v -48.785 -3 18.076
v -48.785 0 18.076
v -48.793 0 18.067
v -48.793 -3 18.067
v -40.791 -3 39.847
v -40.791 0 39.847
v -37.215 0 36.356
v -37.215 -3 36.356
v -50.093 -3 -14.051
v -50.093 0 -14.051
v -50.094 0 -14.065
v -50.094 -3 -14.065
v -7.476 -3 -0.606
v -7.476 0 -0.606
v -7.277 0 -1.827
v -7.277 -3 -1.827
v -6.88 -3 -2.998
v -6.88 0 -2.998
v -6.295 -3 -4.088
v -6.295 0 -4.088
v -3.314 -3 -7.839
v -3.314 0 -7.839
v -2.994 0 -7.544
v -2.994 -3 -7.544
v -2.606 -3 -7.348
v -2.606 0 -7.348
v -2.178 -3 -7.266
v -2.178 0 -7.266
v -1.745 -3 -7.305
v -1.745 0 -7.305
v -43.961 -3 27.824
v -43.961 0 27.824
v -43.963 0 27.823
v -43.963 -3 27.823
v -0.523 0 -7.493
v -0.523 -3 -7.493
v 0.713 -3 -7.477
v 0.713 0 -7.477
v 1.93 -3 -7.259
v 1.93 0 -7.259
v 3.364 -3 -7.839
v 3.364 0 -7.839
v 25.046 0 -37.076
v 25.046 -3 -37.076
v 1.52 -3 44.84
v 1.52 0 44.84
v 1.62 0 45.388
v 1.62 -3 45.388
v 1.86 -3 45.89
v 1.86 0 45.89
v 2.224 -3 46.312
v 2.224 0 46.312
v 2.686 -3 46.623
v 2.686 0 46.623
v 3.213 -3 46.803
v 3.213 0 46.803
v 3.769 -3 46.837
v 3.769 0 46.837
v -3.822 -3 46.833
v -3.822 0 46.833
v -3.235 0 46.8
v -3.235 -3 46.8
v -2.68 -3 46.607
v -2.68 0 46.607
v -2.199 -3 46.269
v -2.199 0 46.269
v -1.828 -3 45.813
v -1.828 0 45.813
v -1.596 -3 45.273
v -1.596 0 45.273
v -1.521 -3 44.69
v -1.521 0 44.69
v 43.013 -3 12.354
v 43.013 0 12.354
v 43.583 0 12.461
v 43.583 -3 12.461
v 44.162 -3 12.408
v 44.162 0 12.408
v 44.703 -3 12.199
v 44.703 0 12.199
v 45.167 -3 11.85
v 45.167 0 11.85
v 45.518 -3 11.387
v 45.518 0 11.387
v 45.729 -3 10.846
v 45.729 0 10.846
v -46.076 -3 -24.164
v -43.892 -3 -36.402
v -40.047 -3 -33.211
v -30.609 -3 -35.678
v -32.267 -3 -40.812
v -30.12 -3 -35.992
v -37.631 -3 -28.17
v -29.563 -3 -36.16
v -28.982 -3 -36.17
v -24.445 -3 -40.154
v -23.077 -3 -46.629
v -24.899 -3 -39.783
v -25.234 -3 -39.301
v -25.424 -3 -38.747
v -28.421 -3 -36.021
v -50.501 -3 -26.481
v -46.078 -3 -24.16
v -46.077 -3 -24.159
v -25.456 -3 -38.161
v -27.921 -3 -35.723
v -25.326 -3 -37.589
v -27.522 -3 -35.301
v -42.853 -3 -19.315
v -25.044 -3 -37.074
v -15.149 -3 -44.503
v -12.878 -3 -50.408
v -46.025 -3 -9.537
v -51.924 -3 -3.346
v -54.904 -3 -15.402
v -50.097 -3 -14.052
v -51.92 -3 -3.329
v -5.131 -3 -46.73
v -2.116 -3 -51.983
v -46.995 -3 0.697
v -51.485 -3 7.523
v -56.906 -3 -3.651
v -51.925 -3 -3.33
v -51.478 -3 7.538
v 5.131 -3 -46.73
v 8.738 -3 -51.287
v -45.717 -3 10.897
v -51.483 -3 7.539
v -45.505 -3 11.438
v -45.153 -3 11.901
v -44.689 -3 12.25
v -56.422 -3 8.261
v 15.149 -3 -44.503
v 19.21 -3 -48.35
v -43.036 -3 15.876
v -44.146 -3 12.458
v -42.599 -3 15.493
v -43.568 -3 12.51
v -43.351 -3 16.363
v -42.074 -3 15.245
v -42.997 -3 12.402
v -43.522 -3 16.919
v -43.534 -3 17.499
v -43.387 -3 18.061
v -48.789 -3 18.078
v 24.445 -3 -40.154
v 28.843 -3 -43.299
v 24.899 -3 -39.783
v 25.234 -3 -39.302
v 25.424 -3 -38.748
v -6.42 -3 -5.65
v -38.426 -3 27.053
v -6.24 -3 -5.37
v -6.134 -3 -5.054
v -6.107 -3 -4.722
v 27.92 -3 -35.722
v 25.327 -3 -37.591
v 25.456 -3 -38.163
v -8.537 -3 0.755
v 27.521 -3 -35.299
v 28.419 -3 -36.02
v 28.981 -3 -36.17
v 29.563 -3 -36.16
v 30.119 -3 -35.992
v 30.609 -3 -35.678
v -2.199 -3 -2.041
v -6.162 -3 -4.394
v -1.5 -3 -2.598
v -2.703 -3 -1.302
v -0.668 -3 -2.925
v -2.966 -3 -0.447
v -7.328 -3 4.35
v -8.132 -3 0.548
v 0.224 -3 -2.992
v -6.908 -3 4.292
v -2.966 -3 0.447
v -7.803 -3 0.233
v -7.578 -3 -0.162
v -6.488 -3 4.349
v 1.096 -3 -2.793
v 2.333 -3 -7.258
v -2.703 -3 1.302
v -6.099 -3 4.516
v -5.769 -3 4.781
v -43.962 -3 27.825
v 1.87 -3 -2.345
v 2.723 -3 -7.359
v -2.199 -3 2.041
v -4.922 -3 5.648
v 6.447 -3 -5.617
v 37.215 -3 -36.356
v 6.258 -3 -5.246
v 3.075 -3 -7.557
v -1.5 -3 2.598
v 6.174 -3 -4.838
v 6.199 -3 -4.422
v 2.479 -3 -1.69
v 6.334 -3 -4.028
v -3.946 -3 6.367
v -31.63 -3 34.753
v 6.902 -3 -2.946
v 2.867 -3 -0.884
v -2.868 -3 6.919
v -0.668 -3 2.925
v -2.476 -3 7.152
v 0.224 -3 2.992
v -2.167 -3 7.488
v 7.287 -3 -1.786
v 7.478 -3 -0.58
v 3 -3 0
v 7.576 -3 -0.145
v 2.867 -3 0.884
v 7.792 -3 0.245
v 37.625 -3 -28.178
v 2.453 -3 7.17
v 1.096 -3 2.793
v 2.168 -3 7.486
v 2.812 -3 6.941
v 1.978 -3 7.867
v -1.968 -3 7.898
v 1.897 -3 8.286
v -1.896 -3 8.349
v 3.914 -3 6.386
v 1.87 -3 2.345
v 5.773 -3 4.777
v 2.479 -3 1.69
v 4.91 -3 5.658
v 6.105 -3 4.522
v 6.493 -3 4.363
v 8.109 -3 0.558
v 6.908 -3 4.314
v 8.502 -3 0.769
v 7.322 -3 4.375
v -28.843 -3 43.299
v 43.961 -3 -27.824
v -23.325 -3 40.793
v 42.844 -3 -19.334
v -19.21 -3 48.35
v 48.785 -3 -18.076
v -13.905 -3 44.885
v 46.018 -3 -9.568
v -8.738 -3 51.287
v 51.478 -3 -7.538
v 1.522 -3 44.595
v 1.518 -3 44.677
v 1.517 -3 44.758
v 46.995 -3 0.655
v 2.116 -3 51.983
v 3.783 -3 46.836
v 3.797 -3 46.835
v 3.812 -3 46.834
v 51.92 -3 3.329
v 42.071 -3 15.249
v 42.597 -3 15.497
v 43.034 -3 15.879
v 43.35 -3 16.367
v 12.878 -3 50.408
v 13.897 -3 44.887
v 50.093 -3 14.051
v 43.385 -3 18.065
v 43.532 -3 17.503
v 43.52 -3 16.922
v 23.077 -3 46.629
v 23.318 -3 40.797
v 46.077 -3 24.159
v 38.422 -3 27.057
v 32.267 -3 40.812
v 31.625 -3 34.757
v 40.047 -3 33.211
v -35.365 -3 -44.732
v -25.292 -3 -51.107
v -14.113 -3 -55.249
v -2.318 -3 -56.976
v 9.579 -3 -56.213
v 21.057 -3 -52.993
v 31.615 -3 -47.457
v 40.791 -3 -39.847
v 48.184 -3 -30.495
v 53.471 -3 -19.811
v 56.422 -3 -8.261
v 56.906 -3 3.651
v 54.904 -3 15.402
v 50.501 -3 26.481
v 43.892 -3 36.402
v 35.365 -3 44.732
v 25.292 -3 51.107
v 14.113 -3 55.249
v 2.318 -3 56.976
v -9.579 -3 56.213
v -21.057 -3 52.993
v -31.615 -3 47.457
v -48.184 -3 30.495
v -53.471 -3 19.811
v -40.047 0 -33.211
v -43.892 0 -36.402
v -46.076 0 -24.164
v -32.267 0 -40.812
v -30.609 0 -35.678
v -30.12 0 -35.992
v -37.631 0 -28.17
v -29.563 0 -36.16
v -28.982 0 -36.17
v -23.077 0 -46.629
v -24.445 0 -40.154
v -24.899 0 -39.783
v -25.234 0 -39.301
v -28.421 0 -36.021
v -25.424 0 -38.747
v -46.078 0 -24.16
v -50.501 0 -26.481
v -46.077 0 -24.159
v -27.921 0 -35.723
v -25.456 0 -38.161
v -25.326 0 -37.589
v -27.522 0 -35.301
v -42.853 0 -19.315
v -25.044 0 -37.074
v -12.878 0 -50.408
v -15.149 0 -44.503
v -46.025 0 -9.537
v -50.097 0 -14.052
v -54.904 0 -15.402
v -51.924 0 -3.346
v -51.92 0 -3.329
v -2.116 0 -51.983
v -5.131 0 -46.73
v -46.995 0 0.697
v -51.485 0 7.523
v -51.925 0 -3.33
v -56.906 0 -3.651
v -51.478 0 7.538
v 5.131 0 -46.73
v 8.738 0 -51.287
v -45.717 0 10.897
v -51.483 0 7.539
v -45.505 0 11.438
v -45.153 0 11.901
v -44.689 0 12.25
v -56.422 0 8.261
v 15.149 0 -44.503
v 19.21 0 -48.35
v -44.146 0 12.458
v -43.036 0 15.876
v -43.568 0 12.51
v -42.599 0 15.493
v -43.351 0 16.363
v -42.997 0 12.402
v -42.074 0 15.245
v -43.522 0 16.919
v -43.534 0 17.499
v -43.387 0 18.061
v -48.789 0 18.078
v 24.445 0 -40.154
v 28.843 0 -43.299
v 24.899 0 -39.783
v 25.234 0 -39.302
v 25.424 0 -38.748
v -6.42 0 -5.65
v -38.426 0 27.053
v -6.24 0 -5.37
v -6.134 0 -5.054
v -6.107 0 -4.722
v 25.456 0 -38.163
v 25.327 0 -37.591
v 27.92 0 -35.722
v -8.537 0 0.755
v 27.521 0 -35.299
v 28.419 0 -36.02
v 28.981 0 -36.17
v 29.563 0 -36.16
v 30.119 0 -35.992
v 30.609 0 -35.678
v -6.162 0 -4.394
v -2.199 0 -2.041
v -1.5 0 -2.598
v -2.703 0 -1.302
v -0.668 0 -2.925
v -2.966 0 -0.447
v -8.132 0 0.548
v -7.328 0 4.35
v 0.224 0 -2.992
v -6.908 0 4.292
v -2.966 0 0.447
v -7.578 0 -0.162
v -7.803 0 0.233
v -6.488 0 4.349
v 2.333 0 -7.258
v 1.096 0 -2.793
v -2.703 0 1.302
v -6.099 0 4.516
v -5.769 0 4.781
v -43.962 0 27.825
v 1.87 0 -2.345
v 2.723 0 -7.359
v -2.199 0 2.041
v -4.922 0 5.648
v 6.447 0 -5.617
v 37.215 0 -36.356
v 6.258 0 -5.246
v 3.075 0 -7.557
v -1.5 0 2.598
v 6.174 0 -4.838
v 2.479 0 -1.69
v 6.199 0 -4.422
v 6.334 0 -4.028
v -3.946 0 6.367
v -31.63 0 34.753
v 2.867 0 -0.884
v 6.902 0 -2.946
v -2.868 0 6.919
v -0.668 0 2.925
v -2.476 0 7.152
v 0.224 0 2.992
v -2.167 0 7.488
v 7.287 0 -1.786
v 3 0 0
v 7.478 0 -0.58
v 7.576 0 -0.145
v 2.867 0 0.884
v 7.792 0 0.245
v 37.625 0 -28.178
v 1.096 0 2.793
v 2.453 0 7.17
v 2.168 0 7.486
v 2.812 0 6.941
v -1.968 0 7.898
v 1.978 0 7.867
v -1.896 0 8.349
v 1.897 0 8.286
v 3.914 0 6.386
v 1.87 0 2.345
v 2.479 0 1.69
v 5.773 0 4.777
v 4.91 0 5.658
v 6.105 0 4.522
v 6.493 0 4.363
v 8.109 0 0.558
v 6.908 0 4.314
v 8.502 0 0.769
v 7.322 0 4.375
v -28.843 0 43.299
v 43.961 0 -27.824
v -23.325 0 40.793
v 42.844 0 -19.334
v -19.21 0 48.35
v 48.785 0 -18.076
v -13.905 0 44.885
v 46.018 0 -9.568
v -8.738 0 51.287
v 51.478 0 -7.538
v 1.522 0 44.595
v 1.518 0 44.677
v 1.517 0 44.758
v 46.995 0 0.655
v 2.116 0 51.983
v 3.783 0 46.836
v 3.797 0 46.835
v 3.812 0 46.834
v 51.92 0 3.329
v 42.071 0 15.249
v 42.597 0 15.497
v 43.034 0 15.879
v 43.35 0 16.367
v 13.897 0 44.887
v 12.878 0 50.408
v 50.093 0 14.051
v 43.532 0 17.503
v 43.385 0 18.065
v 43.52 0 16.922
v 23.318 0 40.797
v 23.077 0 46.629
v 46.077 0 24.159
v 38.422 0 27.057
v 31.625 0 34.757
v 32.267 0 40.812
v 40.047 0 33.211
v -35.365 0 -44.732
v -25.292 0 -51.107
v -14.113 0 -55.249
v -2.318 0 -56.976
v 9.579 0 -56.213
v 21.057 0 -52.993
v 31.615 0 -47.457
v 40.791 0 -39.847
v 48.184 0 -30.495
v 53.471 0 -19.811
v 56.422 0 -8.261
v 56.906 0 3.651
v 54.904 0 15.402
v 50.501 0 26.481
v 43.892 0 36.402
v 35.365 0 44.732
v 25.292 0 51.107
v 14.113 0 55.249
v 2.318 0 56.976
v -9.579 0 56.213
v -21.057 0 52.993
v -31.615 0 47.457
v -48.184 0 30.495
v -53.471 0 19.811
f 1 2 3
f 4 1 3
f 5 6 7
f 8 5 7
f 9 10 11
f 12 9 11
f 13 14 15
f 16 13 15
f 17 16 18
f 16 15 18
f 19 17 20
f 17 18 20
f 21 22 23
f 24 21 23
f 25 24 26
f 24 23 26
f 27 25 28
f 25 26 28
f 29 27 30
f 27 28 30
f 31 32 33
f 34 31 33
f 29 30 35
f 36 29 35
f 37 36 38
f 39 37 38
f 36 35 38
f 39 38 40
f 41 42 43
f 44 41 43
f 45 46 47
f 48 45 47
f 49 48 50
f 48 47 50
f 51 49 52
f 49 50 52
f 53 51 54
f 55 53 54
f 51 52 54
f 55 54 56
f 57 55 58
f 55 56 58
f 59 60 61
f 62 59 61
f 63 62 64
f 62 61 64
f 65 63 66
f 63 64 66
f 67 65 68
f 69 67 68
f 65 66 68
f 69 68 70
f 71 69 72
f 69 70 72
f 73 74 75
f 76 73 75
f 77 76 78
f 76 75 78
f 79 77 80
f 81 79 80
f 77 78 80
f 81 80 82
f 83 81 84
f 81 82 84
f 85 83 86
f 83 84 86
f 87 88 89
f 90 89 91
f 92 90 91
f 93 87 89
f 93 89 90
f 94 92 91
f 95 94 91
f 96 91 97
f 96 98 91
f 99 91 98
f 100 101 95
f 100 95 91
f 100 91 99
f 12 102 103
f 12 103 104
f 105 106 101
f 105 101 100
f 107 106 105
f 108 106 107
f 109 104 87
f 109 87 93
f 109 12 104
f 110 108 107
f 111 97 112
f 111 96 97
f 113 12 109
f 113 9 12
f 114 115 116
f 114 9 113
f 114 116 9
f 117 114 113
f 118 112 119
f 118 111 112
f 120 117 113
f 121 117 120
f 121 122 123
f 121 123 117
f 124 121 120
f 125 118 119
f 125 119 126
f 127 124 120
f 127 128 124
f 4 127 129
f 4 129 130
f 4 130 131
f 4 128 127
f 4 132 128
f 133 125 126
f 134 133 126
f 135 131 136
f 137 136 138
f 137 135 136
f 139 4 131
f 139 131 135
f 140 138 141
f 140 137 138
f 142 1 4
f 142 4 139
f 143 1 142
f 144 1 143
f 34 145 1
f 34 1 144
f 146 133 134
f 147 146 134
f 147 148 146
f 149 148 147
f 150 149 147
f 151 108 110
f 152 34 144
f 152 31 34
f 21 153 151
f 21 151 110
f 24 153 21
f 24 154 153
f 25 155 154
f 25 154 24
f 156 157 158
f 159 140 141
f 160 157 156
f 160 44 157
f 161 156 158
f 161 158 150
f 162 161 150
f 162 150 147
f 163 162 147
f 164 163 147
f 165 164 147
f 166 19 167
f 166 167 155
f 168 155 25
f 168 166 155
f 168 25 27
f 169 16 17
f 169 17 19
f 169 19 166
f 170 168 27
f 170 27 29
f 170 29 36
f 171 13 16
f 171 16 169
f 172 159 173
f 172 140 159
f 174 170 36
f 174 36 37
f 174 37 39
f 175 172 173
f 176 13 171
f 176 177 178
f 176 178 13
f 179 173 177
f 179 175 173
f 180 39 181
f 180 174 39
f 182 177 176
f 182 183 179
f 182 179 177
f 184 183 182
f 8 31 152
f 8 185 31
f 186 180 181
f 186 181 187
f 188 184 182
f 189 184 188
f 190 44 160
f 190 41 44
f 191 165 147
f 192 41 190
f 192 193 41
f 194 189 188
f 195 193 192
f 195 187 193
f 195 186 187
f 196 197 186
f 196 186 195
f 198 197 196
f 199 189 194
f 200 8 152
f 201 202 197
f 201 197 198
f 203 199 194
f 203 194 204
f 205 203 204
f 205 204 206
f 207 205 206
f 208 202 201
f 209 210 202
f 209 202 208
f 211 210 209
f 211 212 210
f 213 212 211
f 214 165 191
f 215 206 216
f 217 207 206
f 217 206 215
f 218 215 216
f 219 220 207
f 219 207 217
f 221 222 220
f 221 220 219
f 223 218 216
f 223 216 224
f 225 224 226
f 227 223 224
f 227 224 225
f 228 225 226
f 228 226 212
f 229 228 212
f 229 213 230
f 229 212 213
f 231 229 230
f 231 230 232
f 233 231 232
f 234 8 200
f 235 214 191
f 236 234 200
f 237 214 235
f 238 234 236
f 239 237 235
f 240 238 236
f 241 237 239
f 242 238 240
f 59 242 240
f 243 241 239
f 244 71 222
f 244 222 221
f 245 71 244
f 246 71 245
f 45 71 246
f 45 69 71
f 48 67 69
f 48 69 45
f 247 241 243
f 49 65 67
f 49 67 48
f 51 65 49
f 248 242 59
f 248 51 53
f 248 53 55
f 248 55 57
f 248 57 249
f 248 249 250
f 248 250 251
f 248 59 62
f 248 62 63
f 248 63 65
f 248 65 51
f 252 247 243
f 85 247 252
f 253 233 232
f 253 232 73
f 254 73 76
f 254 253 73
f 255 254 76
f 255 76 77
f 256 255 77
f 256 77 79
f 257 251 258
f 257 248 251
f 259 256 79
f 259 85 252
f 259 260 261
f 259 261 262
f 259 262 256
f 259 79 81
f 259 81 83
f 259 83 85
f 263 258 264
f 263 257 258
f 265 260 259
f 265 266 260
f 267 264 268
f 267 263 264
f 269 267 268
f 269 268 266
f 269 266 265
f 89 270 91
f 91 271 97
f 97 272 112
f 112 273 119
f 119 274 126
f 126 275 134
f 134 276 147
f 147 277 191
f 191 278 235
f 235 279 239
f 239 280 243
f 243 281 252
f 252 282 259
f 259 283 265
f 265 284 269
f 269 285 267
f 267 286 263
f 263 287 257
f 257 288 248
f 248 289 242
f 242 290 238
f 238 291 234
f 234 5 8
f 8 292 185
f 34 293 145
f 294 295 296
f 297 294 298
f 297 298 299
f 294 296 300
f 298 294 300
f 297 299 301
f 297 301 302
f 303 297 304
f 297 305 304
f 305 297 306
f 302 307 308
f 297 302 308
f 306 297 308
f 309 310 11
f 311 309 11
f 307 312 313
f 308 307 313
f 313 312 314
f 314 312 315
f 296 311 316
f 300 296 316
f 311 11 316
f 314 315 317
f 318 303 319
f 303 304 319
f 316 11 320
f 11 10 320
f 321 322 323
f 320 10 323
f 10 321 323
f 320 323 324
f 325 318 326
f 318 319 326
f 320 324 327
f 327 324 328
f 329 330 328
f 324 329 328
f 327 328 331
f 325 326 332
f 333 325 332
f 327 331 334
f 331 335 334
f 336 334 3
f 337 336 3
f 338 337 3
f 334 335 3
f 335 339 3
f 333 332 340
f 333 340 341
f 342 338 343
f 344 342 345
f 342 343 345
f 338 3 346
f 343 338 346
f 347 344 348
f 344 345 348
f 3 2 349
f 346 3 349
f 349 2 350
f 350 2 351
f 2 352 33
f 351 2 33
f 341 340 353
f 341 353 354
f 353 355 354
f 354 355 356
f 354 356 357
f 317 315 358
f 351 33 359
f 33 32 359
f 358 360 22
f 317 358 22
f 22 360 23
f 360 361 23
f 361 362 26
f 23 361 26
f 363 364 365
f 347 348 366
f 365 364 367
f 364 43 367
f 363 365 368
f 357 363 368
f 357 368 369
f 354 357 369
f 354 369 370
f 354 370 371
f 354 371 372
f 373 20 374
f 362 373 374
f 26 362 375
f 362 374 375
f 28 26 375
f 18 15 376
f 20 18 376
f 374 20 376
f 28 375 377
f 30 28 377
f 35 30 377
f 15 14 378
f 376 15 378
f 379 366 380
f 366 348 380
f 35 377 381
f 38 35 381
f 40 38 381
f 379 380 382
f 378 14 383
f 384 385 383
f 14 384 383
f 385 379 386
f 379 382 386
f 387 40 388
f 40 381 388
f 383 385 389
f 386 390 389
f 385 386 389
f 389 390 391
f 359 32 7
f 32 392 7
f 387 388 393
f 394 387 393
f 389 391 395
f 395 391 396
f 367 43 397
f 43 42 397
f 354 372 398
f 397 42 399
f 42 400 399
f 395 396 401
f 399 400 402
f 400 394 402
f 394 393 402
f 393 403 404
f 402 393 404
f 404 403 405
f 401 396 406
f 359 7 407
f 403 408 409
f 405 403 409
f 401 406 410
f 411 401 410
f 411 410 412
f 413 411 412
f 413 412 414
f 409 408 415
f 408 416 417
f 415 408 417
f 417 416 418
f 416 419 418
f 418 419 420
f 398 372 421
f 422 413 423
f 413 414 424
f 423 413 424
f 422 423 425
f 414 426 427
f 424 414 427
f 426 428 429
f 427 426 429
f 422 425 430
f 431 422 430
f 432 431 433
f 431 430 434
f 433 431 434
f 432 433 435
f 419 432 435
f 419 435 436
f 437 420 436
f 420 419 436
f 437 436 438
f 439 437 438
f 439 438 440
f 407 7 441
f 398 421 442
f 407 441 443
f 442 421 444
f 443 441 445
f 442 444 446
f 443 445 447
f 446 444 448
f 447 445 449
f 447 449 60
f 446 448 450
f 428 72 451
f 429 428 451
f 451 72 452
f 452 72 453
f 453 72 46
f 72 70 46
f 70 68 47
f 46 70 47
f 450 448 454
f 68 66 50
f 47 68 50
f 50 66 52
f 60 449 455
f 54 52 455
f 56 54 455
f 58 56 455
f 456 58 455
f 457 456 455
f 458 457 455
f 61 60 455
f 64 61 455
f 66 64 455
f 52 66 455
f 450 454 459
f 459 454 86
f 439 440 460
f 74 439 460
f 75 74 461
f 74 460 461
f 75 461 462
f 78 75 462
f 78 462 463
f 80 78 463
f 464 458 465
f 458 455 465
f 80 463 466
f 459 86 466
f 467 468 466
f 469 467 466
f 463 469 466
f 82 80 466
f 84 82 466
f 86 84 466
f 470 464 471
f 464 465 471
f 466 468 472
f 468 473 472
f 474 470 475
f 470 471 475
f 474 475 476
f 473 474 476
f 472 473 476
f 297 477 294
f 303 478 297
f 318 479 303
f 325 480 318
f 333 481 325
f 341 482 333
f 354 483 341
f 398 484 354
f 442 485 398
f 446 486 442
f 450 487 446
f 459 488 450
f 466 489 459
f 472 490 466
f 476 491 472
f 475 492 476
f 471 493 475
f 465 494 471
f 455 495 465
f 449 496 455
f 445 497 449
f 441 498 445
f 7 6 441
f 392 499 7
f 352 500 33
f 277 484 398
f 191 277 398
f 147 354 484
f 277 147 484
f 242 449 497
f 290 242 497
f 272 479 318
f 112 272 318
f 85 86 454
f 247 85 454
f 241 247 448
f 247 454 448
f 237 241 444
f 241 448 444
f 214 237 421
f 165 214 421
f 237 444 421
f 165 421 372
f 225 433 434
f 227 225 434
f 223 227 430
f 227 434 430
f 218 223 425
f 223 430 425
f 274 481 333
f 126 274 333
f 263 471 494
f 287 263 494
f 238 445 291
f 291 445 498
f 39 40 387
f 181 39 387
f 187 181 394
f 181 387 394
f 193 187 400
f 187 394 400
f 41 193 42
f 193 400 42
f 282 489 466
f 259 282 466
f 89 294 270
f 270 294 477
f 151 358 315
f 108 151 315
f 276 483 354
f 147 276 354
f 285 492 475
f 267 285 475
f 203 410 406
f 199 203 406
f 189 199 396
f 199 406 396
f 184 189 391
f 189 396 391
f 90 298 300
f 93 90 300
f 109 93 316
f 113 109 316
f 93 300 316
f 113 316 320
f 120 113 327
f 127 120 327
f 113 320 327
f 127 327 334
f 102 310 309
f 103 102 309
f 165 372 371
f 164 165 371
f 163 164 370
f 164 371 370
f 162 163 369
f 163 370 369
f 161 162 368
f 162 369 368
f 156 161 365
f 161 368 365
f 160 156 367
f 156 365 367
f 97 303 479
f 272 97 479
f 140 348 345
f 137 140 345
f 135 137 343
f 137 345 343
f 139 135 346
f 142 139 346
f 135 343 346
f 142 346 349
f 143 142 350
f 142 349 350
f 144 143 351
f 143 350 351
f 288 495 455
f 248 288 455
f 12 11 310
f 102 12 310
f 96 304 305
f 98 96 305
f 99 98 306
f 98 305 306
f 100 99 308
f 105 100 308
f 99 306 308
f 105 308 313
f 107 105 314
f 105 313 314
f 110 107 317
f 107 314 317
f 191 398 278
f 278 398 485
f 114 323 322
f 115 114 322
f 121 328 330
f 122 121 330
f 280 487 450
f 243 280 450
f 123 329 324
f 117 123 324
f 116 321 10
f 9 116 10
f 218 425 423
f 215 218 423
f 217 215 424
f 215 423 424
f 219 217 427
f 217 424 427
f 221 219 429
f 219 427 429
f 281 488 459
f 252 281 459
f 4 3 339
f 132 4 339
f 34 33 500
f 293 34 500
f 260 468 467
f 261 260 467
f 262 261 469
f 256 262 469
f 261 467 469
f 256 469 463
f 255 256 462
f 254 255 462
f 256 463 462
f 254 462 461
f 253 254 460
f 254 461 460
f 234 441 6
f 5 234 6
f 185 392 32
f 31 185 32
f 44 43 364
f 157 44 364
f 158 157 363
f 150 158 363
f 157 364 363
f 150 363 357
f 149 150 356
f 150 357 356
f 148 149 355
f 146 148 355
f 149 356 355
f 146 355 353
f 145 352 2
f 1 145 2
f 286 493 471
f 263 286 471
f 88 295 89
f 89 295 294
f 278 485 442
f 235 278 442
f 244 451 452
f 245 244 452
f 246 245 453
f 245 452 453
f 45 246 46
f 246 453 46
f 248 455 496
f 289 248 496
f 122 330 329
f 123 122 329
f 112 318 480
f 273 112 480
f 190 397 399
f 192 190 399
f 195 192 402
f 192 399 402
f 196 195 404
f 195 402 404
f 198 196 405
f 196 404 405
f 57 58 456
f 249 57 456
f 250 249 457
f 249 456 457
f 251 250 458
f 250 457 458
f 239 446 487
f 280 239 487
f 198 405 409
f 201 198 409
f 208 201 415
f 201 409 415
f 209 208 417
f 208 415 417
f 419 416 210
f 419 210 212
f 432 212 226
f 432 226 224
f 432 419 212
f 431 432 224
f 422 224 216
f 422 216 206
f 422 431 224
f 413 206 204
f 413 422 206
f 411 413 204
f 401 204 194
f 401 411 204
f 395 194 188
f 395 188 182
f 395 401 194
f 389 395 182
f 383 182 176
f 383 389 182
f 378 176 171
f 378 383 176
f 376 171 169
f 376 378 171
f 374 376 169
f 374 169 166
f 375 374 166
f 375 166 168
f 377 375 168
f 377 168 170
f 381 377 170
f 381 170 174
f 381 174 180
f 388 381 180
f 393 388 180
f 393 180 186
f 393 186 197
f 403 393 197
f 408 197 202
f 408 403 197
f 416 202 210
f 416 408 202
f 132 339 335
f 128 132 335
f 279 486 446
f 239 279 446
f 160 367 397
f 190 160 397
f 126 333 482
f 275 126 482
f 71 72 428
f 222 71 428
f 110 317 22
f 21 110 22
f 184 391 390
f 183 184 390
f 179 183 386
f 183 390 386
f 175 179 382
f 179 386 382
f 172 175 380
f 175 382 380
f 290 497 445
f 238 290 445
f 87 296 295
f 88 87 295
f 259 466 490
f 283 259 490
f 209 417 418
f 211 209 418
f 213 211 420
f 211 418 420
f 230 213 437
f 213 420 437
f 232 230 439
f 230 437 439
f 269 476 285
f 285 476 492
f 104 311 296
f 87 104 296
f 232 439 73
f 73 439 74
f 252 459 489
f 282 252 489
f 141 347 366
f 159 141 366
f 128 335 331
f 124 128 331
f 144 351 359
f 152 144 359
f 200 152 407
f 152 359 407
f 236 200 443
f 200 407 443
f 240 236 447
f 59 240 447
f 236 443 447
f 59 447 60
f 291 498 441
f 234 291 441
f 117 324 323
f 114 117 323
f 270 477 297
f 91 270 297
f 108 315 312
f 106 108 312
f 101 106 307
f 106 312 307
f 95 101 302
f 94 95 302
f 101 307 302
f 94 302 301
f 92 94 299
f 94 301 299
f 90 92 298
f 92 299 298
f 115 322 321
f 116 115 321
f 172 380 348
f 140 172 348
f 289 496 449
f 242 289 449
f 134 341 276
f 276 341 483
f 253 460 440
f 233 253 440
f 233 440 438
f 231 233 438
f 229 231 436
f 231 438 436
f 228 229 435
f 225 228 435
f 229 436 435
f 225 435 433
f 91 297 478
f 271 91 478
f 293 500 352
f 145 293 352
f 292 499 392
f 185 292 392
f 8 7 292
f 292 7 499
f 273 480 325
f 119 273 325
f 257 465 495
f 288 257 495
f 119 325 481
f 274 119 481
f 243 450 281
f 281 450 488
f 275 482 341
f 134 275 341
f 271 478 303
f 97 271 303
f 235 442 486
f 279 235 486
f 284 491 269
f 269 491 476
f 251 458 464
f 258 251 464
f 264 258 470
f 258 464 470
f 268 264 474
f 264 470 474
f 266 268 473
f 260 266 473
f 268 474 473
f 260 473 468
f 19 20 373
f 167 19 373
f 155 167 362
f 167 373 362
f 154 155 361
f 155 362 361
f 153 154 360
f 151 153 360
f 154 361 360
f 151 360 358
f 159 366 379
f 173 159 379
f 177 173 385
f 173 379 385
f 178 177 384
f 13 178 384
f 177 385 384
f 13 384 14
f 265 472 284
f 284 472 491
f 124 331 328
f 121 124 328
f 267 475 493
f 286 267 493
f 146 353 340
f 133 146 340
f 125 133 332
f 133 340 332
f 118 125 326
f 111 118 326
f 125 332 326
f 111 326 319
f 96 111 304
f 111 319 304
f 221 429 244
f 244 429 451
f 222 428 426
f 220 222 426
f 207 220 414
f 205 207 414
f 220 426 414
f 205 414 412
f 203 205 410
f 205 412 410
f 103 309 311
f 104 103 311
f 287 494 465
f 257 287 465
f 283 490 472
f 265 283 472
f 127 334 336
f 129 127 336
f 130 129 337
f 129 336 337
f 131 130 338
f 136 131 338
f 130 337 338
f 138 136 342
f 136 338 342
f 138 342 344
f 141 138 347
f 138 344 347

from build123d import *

# Parameters (mm, degrees)
F0_R     = 3
F1_DEPTH = 3


# Not quite as in the source:
# - ends of sketch curves that miss each other by under 0.0002 mm in the source are joined


with BuildPart() as f1:
    # F0 (on Front) → F1 (new body)
    with BuildSketch(Plane.XZ):
        with BuildLine():
            Line((-54.9035550344, -15.4022894368), (-50.0970420264, -14.0523310253))
            ThreePointArc((-50.0970420264, -14.0523310253), (-51.2908672182, -8.7471555647), (-51.9241410289, -3.346315858))
            Line((-51.9241410289, -3.346315858), (-54.9035550344, -15.4022894368))
        make_face()
        with BuildLine():
            Line((-50.5014645894, -26.4808034175), (-46.078343983, -24.1598005565))
            ThreePointArc((-46.078343983, -24.1598005565), (-48.3503436649, -19.2173511497), (-50.0935968915, -14.0645987898))
            Line((-50.0935968915, -14.0645987898), (-50.5014645894, -26.4808034175))
        make_face()
        with BuildLine():
            Line((-40.0472224692, -33.2111693559), (-40.0453648746, -33.2096278115))
            ThreePointArc((-40.0453648746, -33.2096278115), (-43.2978694534, -28.8447489774), (-46.0762579844, -24.1637757408))
            Line((-46.0762579844, -24.1637757408), (-43.8922178089, -36.4019792199))
            Line((-43.8922178089, -36.4019792199), (-40.0472224692, -33.2111693559))
        make_face()
        with BuildLine():
            ThreePointArc((-37.213042666, 36.354113843), (19.5968885399, 48.1537005723), (51.9680282572, 0.0007375898))
            ThreePointArc((51.9680282572, 0.0007375898), (17.6216901599, -48.9108992815), (-40.0453648746, -33.2096278115))
            Line((-40.0453648746, -33.2096278115), (-40.0472224692, -33.2111693559))
            Line((-40.0472224692, -33.2111693559), (-35.3646704919, -44.7322138543))
            Line((-35.3646704919, -44.7322138543), (-32.2671041994, -40.8117113592))
            Line((-32.2671041994, -40.8117113592), (-25.291517376, -51.1074360943))
            Line((-25.291517376, -51.1074360943), (-23.0767586415, -46.6285857397))
            Line((-23.0767586415, -46.6285857397), (-14.1130035885, -55.2490181363))
            Line((-14.1130035885, -55.2490181363), (-12.8778479963, -50.4075671746))
            Line((-12.8778479963, -50.4075671746), (-2.3176838225, -56.9759529715))
            Line((-2.3176838225, -56.9759529715), (-2.1161135989, -51.9834960417))
            Line((-2.1161135989, -51.9834960417), (9.578929848, -56.2127652609))
            Line((9.578929848, -56.2127652609), (8.738105117, -51.2874966872))
            Line((8.738105117, -51.2874966872), (21.0568983194, -52.9928099697))
            Line((21.0568983194, -52.9928099697), (19.2104267092, -48.3499876228))
            Line((19.2104267092, -48.3499876228), (31.614579292, -47.456814595))
            Line((31.614579292, -47.456814595), (28.8431604724, -43.2993520904))
            Line((28.8431604724, -43.2993520904), (40.7905514459, -39.8467286995))
            Line((40.7905514459, -39.8467286995), (37.2153097181, -36.3563270982))
            Line((37.2153097181, -36.3563270982), (48.1837807669, -30.495149554))
            Line((48.1837807669, -30.495149554), (43.9609713502, -27.8243561548))
            Line((43.9609713502, -27.8243561548), (53.4711476569, -19.810786041))
            Line((53.4711476569, -19.810786041), (48.7853275862, -18.0763273313))
            Line((48.7853275862, -18.0763273313), (56.4215688113, -8.2605961153))
            Line((56.4215688113, -8.2605961153), (51.4775309087, -7.5382762637))
            Line((51.4775309087, -7.5382762637), (56.9060966679, 3.6506214993))
            Line((56.9060966679, 3.6506214993), (51.9199191138, 3.3292336493))
            Line((51.9199191138, 3.3292336493), (54.9035550344, 15.4022894368))
            Line((54.9035550344, 15.4022894368), (50.0931577143, 14.0512400765))
            Line((50.0931577143, 14.0512400765), (50.5014645894, 26.4808034175))
            Line((50.5014645894, 26.4808034175), (46.0770849491, 24.1591398869))
            Line((46.0770849491, 24.1591398869), (43.8922178089, 36.4019792199))
            Line((43.8922178089, 36.4019792199), (40.0472224692, 33.2111693559))
            Line((40.0472224692, 33.2111693559), (35.3646704919, 44.7322138543))
            Line((35.3646704919, 44.7322138543), (32.2671041994, 40.8117113592))
            Line((32.2671041994, 40.8117113592), (25.291517376, 51.1074360943))
            Line((25.291517376, 51.1074360943), (23.0767586415, 46.6285857397))
            Line((23.0767586415, 46.6285857397), (14.1130035885, 55.2490181363))
            Line((14.1130035885, 55.2490181363), (12.8778479963, 50.4075671746))
            Line((12.8778479963, 50.4075671746), (2.3176838225, 56.9759529715))
            Line((2.3176838225, 56.9759529715), (2.1161135989, 51.9834960417))
            Line((2.1161135989, 51.9834960417), (-9.578929848, 56.2127652609))
            Line((-9.578929848, 56.2127652609), (-8.738105117, 51.2874966872))
            Line((-8.738105117, 51.2874966872), (-21.0568983194, 52.9928099697))
            Line((-21.0568983194, 52.9928099697), (-19.2104267092, 48.3499876228))
            Line((-19.2104267092, 48.3499876228), (-31.614579292, 47.456814595))
            Line((-31.614579292, 47.456814595), (-28.8431604724, 43.2993520904))
            Line((-28.8431604724, 43.2993520904), (-40.7905514459, 39.8467286995))
            Line((-40.7905514459, 39.8467286995), (-37.2153097181, 36.3563270982))
            Line((-37.2153097181, 36.3563270982), (-37.213042666, 36.354113843))
        make_face()
        with BuildLine():
            ThreePointArc((-51.9252180927, -3.329575199), (-51.9892512273, 2.1081313753), (-51.4850447931, 7.5227900813))
            Line((-51.4850447931, 7.5227900813), (-56.9060966679, -3.6506214993))
            Line((-56.9060966679, -3.6506214993), (-51.9252180927, -3.329575199))
        make_face()
        with BuildLine():
            ThreePointArc((-51.4826684815, 7.5390268588), (-50.4134868512, 12.8733028114), (-48.7928353928, 18.0666772584))
            Line((-48.7928353928, 18.0666772584), (-56.4215688113, 8.2605961153))
            Line((-56.4215688113, 8.2605961153), (-51.4826684815, 7.5390268588))
        make_face()
        with BuildLine():
            ThreePointArc((-48.7887845482, 18.0776069276), (-46.6313999834, 23.0765536675), (-43.9631489083, 27.8225217319))
            Line((-43.9631489083, 27.8225217319), (-53.4711476569, 19.810786041))
            Line((-53.4711476569, 19.810786041), (-48.7887845482, 18.0776069276))
        make_face()
        with BuildLine():
            ThreePointArc((-43.9616965875, 27.8248148444), (-40.810980226, 32.2663921953), (-37.213042666, 36.354113843))
            Line((-37.213042666, 36.354113843), (-37.2153097181, 36.3563270982))
            Line((-37.2153097181, 36.3563270982), (-48.1837807669, 30.495149554))
            Line((-48.1837807669, 30.495149554), (-43.9616965875, 27.8248148444))
        make_face()
        with BuildLine():
            ThreePointArc((-40.0453648746, -33.2096278115), (17.6216901599, -48.9108992815), (51.9680282572, 0.0007375898))
            ThreePointArc((51.9680282572, 0.0007375898), (19.5968885399, 48.1537005723), (-37.213042666, 36.354113843))
            ThreePointArc((-37.213042666, 36.354113843), (-40.810980226, 32.2663921953), (-43.9616965875, 27.8248148444))
            Line((-43.9616965875, 27.8248148444), (-43.9609713502, 27.8243561548))
            Line((-43.9609713502, 27.8243561548), (-43.9631489083, 27.8225217319))
            ThreePointArc((-43.9631489083, 27.8225217319), (-46.6313999834, 23.0765536675), (-48.7887845482, 18.0776069276))
            Line((-48.7887845482, 18.0776069276), (-48.7853275862, 18.0763273313))
            Line((-48.7853275862, 18.0763273313), (-48.7928353928, 18.0666772584))
            ThreePointArc((-48.7928353928, 18.0666772584), (-50.4134868512, 12.8733028114), (-51.4826684815, 7.5390268588))
            Line((-51.4826684815, 7.5390268588), (-51.4775309087, 7.5382762637))
            Line((-51.4775309087, 7.5382762637), (-51.4850447931, 7.5227900813))
            ThreePointArc((-51.4850447931, 7.5227900813), (-51.9892512273, 2.1081313753), (-51.9252180927, -3.329575199))
            Line((-51.9252180927, -3.329575199), (-51.9199191138, -3.3292336493))
            Line((-51.9199191138, -3.3292336493), (-51.9241410289, -3.346315858))
            ThreePointArc((-51.9241410289, -3.346315858), (-51.2908672182, -8.7471555647), (-50.0970420264, -14.0523310253))
            Line((-50.0970420264, -14.0523310253), (-50.0931577143, -14.0512400765))
            Line((-50.0931577143, -14.0512400765), (-50.0935968915, -14.0645987898))
            ThreePointArc((-50.0935968915, -14.0645987898), (-48.3503436649, -19.2173511497), (-46.078343983, -24.1598005565))
            Line((-46.078343983, -24.1598005565), (-46.0770849491, -24.1591398869))
            Line((-46.0770849491, -24.1591398869), (-46.0762579844, -24.1637757408))
            ThreePointArc((-46.0762579844, -24.1637757408), (-43.2978694534, -28.8447489774), (-40.0453648746, -33.2096278115))
        make_face()
        with BuildLine():
            ThreePointArc((-30.6087391151, -35.6778020758), (-44.7067731309, -14.5130968099), (-45.716604598, 10.8971285435))
            ThreePointArc((-45.716604598, 10.8971285435), (-44.6888266126, 12.2495178643), (-42.9970423633, 12.4016708018))
            Line((-42.9970423633, 12.4016708018), (-8.5374908198, 0.7549345664))
            ThreePointArc((-8.5374908198, 0.7549345664), (-7.802812606, 0.2334413444), (-7.4763562171, -0.606280922))
            ThreePointArc((-7.4763562171, -0.606280922), (-7.1023953356, -2.4207800492), (-6.295061591, -4.0882530021))
            ThreePointArc((-6.295061591, -4.0882530021), (-6.110368074, -4.8890528159), (-6.4203264896, -5.6501821199))
            Line((-6.4203264896, -5.6501821199), (-27.5220429881, -35.3008406001))
            ThreePointArc((-27.5220429881, -35.3008406001), (-28.982263813, -36.169997062), (-30.6087391151, -35.6778020758))
        make_face(mode=Mode.SUBTRACT)
        with BuildLine():
            ThreePointArc((-3.3140903569, -7.8390852899), (-2.605779553, -7.348009739), (-1.7449401376, -7.3054081862))
            ThreePointArc((-1.7449401376, -7.3054081862), (0.0953413286, -7.5106137979), (1.9298112192, -7.258690321))
            ThreePointArc((1.9298112192, -7.258690321), (2.7233576861, -7.359465878), (3.3639632378, -7.8385235312))
            Line((3.3639632378, -7.8385235312), (25.0458548563, -37.0762875112))
            ThreePointArc((25.0458548563, -37.0762875112), (25.4242166332, -38.7478039241), (24.4447545721, -40.15413917))
            ThreePointArc((24.4447545721, -40.15413917), (0, -47.0112198203), (-24.4447545721, -40.15413917))
            ThreePointArc((-24.4447545721, -40.15413917), (-25.4244419331, -38.7466486047), (-25.0444515303, -37.0743973345))
            Line((-25.0444515303, -37.0743973345), (-3.3140903569, -7.8390852899))
        make_face(mode=Mode.SUBTRACT)
        Circle(F0_R, mode=Mode.SUBTRACT)
        with BuildLine():
            ThreePointArc((6.4471741649, -5.6173093292), (6.1735472682, -4.8379856687), (6.3338513372, -4.0277266657))
            ThreePointArc((6.3338513372, -4.0277266657), (7.1180750013, -2.3740588492), (7.4784253342, -0.5796866358))
            ThreePointArc((7.4784253342, -0.5796866358), (7.7924795682, 0.2445578995), (8.501749914, 0.7689095872))
            Line((8.501749914, 0.7689095872), (43.0127487418, 12.3542340284))
            ThreePointArc((43.0127487418, 12.3542340284), (44.7033596143, 12.1990887403), (45.7287674683, 10.8460277972))
            ThreePointArc((45.7287674683, 10.8460277972), (44.6986623329, -14.5380772109), (30.6087391151, -35.6778020758))
            ThreePointArc((30.6087391151, -35.6778020758), (28.981088763, -36.1698532243), (27.5206712423, -35.2989108229))
            Line((27.5206712423, -35.2989108229), (6.4471741649, -5.6173093292))
        make_face(mode=Mode.SUBTRACT)
        with BuildLine():
            ThreePointArc((-3.8222602806, 46.8331002873), (-2.1987863566, 46.2693571068), (-1.5211456849, 44.6900290612))
            Line((-1.5211456849, 44.6900290612), (-1.8962351794, 8.3486142496))
            ThreePointArc((-1.8962351794, 8.3486142496), (-2.1672430487, 7.4877471123), (-2.8678543046, 6.9188170979))
            ThreePointArc((-2.8678543046, 6.9188170979), (-4.448699798, 6.0269148343), (-5.7689849741, 4.7813590646))
            ThreePointArc((-5.7689849741, 4.7813590646), (-6.4883786855, 4.349305408), (-7.327543237, 4.3500331389))
            Line((-7.327543237, 4.3500331389), (-42.0742299498, 15.2448326022))
            ThreePointArc((-42.0742299498, 15.2448326022), (-43.3514722345, 16.3633646212), (-43.3866659022, 18.060781228))
            ThreePointArc((-43.3866659022, 18.060781228), (-27.6429423876, 38.0001960459), (-3.8222602806, 46.8331002873))
        make_face(mode=Mode.SUBTRACT)
        with BuildLine():
            ThreePointArc((7.3223415791, 4.3754103913), (6.4925133297, 4.3634953347), (5.7728084591, 4.7767528711))
            ThreePointArc((5.7728084591, 4.7767528711), (4.4269848697, 6.0428535987), (2.8124529645, 6.9414852879))
            ThreePointArc((2.8124529645, 6.9414852879), (2.1677110719, 7.4862173416), (1.8968851416, 8.2856411552))
            Line((1.8968851416, 8.2856411552), (1.5221296421, 44.5946960866))
            ThreePointArc((1.5221296421, 44.5946960866), (1.51727433, 44.7174608453), (1.5195947017, 44.8402996661))
            ThreePointArc((1.5195947017, 44.8402996661), (2.223945132, 46.3120259473), (3.7686203119, 46.8374461259))
            ThreePointArc((3.7686203119, 46.8374461259), (3.7902743371, 46.8356991867), (3.8119275524, 46.8339422387))
            ThreePointArc((3.8119275524, 46.8339422387), (27.6368928258, 38.0045947169), (43.3848998793, 18.0650204541))
            ThreePointArc((43.3848998793, 18.0650204541), (43.3495674455, 16.3669469507), (42.0713630645, 15.2485125252))
            Line((42.0713630645, 15.2485125252), (7.3223415791, 4.3754103913))
        make_face(mode=Mode.SUBTRACT)
    extrude(amount=F1_DEPTH)


solid = f1.part
